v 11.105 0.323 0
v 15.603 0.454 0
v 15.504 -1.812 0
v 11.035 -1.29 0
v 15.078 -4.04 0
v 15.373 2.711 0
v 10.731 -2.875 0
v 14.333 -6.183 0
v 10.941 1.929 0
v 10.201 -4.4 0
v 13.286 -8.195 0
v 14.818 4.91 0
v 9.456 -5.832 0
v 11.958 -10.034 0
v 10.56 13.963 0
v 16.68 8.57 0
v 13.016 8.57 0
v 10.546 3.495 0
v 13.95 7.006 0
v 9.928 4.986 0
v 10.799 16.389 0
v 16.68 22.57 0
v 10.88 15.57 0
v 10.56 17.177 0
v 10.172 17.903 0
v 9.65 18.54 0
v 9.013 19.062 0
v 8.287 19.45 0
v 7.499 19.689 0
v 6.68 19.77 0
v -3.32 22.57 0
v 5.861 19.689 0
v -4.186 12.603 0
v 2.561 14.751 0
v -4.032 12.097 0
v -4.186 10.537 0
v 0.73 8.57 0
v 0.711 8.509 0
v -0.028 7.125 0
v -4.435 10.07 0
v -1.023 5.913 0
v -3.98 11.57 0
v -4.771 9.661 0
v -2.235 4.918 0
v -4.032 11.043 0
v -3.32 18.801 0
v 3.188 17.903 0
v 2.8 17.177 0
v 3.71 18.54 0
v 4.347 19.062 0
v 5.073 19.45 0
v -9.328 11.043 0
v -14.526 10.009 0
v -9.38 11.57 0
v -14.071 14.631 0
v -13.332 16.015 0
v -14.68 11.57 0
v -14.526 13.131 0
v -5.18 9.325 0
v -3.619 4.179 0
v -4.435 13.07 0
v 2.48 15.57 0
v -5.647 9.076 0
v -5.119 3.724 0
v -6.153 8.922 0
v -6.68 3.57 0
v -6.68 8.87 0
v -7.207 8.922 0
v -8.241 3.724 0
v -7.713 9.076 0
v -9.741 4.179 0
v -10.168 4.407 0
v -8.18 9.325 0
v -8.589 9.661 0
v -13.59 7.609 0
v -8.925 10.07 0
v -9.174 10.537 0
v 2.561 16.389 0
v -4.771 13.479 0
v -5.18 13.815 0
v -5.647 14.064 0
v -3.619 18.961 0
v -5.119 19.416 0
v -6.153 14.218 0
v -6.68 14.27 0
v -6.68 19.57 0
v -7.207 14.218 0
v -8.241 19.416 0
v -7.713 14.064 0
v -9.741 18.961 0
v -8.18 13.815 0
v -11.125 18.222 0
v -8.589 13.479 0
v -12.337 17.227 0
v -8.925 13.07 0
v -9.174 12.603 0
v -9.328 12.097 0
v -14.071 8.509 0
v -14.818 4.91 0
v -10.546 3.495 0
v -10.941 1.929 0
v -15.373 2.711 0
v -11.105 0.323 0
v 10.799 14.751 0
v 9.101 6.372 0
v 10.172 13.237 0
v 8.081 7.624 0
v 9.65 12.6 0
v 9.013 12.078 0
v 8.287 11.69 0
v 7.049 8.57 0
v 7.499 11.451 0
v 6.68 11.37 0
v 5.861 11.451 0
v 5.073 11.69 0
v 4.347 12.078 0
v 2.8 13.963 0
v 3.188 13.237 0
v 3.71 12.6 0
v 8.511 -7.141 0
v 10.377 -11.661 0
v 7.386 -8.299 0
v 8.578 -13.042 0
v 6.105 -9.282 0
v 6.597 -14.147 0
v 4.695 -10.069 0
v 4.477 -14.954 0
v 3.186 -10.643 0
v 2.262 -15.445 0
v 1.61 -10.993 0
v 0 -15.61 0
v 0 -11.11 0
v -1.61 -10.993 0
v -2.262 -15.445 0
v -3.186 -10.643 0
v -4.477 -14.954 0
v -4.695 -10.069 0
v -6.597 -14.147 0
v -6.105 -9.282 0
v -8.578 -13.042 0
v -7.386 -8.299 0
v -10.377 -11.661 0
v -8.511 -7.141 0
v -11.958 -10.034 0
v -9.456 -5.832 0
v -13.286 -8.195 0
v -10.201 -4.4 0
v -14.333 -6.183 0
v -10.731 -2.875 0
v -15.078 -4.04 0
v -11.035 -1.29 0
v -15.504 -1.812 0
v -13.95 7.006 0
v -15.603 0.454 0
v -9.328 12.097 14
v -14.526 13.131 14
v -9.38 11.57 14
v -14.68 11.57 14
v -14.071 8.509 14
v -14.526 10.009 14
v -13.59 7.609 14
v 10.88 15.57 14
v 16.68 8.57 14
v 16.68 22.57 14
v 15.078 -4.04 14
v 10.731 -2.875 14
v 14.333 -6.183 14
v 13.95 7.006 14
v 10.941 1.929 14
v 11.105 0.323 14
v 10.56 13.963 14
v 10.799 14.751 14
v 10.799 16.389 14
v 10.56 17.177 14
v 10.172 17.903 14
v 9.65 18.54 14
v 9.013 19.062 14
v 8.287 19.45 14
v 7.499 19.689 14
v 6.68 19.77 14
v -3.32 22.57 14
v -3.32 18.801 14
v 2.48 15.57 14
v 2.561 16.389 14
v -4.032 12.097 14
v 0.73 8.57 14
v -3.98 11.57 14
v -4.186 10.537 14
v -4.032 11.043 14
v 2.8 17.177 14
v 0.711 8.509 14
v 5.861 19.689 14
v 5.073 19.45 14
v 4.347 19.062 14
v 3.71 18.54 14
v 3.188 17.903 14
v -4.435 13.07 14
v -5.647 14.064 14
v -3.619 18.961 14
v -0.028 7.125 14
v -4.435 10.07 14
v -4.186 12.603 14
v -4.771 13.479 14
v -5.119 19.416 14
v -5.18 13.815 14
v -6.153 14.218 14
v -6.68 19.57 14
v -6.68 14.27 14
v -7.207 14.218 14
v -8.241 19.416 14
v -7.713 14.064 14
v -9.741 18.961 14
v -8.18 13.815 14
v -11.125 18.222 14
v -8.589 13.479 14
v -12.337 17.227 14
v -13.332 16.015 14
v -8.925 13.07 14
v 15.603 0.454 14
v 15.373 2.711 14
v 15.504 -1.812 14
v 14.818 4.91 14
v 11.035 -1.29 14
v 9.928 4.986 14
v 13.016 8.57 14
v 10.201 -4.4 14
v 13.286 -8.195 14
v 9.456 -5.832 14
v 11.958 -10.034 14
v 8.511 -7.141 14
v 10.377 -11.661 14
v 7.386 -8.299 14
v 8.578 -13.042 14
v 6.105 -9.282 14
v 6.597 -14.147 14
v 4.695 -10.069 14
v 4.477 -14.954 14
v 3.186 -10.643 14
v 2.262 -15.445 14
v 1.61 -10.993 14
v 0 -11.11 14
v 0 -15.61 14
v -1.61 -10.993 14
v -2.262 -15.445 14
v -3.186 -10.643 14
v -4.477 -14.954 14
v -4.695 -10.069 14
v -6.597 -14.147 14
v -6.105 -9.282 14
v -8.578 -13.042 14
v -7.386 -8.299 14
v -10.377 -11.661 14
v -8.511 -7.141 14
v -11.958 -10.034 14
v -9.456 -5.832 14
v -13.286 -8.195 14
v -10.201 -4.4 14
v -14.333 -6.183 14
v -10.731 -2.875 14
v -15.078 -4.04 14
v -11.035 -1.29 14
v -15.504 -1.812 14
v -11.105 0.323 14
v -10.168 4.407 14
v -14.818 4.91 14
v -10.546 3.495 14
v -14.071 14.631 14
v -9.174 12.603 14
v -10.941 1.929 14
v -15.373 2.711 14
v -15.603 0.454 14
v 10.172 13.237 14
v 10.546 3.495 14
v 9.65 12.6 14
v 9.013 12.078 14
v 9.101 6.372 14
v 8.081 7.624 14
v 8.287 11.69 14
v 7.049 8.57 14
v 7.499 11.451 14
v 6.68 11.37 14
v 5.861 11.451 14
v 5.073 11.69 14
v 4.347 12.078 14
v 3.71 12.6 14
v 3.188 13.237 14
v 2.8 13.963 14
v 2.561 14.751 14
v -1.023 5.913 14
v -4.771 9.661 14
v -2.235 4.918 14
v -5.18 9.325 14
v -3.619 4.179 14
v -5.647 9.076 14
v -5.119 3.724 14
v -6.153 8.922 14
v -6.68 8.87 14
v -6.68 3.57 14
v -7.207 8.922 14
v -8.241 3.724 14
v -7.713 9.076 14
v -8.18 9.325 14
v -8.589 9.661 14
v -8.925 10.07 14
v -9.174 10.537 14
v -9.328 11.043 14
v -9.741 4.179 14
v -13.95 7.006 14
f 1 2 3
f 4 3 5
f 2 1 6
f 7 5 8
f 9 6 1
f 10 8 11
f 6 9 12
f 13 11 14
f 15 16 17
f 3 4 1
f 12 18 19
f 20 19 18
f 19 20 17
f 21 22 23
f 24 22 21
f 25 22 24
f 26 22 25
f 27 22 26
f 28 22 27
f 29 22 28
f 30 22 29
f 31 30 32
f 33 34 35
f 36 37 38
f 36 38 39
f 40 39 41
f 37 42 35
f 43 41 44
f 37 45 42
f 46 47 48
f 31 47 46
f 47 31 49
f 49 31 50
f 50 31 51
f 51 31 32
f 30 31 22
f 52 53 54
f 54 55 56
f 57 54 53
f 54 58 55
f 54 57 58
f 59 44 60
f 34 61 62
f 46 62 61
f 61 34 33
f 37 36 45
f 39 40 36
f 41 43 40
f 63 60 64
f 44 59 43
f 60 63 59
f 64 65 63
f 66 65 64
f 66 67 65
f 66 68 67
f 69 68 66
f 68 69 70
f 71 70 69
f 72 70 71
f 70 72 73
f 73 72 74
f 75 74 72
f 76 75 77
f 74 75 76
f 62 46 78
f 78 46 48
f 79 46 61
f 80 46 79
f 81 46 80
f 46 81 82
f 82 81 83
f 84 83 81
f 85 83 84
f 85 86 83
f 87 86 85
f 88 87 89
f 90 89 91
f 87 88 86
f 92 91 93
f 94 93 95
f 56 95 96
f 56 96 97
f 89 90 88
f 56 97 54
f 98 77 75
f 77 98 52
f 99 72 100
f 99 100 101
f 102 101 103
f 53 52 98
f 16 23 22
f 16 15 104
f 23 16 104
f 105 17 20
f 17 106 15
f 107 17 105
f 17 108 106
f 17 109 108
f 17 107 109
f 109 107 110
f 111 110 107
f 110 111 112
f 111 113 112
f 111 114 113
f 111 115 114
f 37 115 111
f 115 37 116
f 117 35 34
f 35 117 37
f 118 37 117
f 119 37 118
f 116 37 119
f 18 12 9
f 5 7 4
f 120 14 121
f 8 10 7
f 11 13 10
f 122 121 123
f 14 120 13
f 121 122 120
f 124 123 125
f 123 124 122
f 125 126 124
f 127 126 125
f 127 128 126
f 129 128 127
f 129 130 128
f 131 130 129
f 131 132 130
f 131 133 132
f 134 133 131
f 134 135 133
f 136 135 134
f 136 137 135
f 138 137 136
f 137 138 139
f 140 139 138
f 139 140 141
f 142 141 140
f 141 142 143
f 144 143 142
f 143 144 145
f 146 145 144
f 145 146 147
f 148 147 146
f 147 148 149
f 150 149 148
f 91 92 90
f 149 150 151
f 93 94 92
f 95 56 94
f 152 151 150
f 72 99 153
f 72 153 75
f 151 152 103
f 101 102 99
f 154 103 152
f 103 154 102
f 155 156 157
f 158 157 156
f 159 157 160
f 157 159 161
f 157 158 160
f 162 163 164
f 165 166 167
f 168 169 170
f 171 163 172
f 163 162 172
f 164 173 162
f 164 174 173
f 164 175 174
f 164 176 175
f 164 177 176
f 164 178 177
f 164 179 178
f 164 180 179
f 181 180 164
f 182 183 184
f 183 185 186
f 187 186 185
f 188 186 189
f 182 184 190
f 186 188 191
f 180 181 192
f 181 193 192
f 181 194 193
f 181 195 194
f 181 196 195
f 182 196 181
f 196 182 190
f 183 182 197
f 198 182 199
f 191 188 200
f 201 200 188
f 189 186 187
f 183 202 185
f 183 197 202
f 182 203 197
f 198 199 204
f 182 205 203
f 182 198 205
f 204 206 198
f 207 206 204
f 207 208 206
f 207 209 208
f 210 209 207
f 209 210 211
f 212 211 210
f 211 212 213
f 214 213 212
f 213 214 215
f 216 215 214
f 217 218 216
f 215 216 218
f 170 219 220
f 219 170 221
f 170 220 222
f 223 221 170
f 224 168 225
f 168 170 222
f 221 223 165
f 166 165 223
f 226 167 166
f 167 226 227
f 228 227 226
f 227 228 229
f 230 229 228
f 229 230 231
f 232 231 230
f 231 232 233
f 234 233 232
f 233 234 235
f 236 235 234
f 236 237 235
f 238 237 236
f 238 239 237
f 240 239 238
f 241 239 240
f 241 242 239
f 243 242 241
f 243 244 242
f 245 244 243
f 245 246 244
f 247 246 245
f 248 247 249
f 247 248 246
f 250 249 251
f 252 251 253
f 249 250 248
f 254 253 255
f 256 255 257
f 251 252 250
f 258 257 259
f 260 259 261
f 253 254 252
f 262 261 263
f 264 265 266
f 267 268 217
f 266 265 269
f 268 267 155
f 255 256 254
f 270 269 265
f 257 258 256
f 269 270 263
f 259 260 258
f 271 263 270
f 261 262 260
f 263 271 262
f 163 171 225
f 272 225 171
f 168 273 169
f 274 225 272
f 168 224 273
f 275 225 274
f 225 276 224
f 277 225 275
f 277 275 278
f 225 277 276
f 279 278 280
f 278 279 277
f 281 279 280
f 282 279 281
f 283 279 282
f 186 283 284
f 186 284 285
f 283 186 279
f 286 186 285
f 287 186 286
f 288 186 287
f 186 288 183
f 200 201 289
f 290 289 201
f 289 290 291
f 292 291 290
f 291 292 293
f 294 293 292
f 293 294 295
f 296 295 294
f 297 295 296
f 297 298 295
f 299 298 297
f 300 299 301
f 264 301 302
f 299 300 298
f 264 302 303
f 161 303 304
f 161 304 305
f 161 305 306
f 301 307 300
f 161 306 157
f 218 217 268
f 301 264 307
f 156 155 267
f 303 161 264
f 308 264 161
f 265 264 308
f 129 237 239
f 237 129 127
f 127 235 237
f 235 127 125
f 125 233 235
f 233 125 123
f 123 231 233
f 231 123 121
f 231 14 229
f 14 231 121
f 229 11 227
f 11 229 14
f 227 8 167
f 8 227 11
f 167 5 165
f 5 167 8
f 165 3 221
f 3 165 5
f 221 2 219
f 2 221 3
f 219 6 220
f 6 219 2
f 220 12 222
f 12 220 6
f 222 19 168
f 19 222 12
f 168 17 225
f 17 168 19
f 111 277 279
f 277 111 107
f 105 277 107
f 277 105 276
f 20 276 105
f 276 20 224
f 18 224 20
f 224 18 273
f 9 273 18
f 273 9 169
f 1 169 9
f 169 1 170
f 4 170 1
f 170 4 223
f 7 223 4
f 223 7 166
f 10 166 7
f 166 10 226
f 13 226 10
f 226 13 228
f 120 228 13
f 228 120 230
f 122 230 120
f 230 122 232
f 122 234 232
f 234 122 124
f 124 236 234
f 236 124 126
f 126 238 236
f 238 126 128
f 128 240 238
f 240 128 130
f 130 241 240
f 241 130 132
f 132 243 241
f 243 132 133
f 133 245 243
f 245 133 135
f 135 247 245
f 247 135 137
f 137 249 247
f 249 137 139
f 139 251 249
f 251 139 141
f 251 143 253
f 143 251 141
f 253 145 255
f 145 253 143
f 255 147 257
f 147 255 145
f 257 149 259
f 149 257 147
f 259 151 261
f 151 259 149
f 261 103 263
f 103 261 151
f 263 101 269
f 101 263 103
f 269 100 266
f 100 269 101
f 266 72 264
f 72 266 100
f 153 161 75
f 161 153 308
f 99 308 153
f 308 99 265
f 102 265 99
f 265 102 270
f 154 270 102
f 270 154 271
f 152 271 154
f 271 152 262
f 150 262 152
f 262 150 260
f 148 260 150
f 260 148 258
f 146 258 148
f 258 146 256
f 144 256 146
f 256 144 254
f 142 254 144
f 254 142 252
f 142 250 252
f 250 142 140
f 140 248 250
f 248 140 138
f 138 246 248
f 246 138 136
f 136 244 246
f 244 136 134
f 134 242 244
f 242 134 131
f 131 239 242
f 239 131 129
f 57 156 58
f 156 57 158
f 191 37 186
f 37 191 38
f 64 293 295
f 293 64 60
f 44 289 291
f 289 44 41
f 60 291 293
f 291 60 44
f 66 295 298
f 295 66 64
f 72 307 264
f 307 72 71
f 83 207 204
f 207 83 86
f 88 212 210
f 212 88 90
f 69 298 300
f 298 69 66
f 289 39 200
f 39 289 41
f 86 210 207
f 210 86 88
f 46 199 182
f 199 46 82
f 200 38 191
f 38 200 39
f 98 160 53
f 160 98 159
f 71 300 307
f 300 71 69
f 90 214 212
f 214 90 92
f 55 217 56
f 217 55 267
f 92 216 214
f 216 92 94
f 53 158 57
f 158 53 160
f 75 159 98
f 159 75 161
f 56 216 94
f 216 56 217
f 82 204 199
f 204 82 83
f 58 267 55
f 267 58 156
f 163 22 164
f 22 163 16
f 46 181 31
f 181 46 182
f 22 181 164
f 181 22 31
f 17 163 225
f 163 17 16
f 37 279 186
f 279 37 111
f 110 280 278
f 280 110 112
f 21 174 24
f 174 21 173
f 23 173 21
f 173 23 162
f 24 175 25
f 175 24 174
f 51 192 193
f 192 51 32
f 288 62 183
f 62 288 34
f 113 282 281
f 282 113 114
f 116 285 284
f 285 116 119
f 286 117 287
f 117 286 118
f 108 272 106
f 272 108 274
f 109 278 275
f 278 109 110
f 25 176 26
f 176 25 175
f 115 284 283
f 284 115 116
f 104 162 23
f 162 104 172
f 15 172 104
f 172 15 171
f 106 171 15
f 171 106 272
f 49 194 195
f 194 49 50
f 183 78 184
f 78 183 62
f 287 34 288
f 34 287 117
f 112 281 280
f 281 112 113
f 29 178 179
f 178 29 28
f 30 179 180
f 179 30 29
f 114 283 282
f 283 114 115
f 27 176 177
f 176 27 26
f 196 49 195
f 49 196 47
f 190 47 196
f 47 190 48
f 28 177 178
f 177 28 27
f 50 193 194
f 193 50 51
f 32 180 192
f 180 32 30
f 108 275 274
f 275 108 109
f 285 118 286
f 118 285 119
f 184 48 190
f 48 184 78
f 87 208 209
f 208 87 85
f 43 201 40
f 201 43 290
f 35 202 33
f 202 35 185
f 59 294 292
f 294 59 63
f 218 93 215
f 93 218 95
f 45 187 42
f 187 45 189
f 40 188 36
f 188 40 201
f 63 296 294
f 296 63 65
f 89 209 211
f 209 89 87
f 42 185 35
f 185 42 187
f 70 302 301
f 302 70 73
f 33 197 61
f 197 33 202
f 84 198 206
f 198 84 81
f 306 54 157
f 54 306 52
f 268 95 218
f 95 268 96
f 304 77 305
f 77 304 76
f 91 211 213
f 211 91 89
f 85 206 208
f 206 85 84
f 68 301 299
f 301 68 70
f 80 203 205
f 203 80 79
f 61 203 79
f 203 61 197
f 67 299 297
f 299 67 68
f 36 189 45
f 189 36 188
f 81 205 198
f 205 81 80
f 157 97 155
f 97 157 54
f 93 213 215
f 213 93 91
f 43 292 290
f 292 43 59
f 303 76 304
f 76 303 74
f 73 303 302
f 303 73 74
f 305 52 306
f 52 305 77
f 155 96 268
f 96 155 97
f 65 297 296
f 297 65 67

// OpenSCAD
$fn = 32;

// ----------------------------------------------------------------------
// Pipe clamp: 31.22 mm ring, 4.5 mm wall, 14 mm wide
// ----------------------------------------------------------------------

// --- parameters (mm) ---
outer_r = 15.61;          // clamp outside radius
inner_r = 11.11;          // pipe bore radius
band = 4.5;               // band thickness
clamp_w = 14;             // clamp width
opening = 60;             // opening angle between the ends
lug_w = 20;               // lug width
lug_len = 14;             // lug length
bolt_d = 8.4;             // bolt hole
knuckle_d = 16;           // hinge knuckle diameter
pin_d = 5.4;              // hinge pin hole

clamp_profile = [[-7.805, 13.519], [-9.682, 12.245], [-11.354, 10.712], [-12.787, 8.954], [-13.95, 7.006], [-14.818, 4.91], [-15.373, 2.711], [-15.603, 0.454], [-15.504, -1.812], [-15.078, -4.04], [-14.333, -6.183], [-13.286, -8.195], [-11.958, -10.034], [-10.377, -11.661], [-8.578, -13.042], [-6.597, -14.147], [-4.477, -14.954], [-2.262, -15.445], [0, -15.61], [2.262, -15.445], [4.477, -14.954], [6.597, -14.147], [8.578, -13.042], [10.377, -11.661], [11.958, -10.034], [13.286, -8.195], [14.333, -6.183], [15.078, -4.04], [15.504, -1.812], [15.603, 0.454], [15.373, 2.711], [14.818, 4.91], [13.95, 7.006], [12.787, 8.954], [11.354, 10.712], [9.682, 12.245], [7.805, 13.519], [5.555, 9.622], [6.891, 8.715], [8.081, 7.624], [9.101, 6.372], [9.928, 4.986], [10.546, 3.495], [10.941, 1.929], [11.105, 0.323], [11.035, -1.29], [10.731, -2.875], [10.201, -4.4], [9.456, -5.832], [8.511, -7.141], [7.386, -8.299], [6.105, -9.282], [4.695, -10.069], [3.186, -10.643], [1.61, -10.993], [0, -11.11], [-1.61, -10.993], [-3.186, -10.643], [-4.695, -10.069], [-6.105, -9.282], [-7.386, -8.299], [-8.511, -7.141], [-9.456, -5.832], [-10.201, -4.4], [-10.731, -2.875], [-11.035, -1.29], [-11.105, 0.323], [-10.941, 1.929], [-10.546, 3.495], [-9.928, 4.986], [-9.101, 6.372], [-8.081, 7.624], [-6.891, 8.715], [-5.555, 9.622]];

difference() {
  union() {
    linear_extrude(height = clamp_w) polygon(clamp_profile);
    /* hinge knuckle, sunk 2 mm into the band end */
    translate([-6.68, 11.57, 0]) cylinder(h = clamp_w, d = knuckle_d);
    /* bolt lug on the other end */
    translate([-3.32, 8.57, 0]) cube([lug_w, 14, clamp_w]);
  }
  translate([6.68, 15.57, -2.5]) cylinder(h = clamp_w + 5, d = bolt_d);
  translate([-6.68, 11.57, -2.5]) cylinder(h = clamp_w + 5, d = pin_d);
}
